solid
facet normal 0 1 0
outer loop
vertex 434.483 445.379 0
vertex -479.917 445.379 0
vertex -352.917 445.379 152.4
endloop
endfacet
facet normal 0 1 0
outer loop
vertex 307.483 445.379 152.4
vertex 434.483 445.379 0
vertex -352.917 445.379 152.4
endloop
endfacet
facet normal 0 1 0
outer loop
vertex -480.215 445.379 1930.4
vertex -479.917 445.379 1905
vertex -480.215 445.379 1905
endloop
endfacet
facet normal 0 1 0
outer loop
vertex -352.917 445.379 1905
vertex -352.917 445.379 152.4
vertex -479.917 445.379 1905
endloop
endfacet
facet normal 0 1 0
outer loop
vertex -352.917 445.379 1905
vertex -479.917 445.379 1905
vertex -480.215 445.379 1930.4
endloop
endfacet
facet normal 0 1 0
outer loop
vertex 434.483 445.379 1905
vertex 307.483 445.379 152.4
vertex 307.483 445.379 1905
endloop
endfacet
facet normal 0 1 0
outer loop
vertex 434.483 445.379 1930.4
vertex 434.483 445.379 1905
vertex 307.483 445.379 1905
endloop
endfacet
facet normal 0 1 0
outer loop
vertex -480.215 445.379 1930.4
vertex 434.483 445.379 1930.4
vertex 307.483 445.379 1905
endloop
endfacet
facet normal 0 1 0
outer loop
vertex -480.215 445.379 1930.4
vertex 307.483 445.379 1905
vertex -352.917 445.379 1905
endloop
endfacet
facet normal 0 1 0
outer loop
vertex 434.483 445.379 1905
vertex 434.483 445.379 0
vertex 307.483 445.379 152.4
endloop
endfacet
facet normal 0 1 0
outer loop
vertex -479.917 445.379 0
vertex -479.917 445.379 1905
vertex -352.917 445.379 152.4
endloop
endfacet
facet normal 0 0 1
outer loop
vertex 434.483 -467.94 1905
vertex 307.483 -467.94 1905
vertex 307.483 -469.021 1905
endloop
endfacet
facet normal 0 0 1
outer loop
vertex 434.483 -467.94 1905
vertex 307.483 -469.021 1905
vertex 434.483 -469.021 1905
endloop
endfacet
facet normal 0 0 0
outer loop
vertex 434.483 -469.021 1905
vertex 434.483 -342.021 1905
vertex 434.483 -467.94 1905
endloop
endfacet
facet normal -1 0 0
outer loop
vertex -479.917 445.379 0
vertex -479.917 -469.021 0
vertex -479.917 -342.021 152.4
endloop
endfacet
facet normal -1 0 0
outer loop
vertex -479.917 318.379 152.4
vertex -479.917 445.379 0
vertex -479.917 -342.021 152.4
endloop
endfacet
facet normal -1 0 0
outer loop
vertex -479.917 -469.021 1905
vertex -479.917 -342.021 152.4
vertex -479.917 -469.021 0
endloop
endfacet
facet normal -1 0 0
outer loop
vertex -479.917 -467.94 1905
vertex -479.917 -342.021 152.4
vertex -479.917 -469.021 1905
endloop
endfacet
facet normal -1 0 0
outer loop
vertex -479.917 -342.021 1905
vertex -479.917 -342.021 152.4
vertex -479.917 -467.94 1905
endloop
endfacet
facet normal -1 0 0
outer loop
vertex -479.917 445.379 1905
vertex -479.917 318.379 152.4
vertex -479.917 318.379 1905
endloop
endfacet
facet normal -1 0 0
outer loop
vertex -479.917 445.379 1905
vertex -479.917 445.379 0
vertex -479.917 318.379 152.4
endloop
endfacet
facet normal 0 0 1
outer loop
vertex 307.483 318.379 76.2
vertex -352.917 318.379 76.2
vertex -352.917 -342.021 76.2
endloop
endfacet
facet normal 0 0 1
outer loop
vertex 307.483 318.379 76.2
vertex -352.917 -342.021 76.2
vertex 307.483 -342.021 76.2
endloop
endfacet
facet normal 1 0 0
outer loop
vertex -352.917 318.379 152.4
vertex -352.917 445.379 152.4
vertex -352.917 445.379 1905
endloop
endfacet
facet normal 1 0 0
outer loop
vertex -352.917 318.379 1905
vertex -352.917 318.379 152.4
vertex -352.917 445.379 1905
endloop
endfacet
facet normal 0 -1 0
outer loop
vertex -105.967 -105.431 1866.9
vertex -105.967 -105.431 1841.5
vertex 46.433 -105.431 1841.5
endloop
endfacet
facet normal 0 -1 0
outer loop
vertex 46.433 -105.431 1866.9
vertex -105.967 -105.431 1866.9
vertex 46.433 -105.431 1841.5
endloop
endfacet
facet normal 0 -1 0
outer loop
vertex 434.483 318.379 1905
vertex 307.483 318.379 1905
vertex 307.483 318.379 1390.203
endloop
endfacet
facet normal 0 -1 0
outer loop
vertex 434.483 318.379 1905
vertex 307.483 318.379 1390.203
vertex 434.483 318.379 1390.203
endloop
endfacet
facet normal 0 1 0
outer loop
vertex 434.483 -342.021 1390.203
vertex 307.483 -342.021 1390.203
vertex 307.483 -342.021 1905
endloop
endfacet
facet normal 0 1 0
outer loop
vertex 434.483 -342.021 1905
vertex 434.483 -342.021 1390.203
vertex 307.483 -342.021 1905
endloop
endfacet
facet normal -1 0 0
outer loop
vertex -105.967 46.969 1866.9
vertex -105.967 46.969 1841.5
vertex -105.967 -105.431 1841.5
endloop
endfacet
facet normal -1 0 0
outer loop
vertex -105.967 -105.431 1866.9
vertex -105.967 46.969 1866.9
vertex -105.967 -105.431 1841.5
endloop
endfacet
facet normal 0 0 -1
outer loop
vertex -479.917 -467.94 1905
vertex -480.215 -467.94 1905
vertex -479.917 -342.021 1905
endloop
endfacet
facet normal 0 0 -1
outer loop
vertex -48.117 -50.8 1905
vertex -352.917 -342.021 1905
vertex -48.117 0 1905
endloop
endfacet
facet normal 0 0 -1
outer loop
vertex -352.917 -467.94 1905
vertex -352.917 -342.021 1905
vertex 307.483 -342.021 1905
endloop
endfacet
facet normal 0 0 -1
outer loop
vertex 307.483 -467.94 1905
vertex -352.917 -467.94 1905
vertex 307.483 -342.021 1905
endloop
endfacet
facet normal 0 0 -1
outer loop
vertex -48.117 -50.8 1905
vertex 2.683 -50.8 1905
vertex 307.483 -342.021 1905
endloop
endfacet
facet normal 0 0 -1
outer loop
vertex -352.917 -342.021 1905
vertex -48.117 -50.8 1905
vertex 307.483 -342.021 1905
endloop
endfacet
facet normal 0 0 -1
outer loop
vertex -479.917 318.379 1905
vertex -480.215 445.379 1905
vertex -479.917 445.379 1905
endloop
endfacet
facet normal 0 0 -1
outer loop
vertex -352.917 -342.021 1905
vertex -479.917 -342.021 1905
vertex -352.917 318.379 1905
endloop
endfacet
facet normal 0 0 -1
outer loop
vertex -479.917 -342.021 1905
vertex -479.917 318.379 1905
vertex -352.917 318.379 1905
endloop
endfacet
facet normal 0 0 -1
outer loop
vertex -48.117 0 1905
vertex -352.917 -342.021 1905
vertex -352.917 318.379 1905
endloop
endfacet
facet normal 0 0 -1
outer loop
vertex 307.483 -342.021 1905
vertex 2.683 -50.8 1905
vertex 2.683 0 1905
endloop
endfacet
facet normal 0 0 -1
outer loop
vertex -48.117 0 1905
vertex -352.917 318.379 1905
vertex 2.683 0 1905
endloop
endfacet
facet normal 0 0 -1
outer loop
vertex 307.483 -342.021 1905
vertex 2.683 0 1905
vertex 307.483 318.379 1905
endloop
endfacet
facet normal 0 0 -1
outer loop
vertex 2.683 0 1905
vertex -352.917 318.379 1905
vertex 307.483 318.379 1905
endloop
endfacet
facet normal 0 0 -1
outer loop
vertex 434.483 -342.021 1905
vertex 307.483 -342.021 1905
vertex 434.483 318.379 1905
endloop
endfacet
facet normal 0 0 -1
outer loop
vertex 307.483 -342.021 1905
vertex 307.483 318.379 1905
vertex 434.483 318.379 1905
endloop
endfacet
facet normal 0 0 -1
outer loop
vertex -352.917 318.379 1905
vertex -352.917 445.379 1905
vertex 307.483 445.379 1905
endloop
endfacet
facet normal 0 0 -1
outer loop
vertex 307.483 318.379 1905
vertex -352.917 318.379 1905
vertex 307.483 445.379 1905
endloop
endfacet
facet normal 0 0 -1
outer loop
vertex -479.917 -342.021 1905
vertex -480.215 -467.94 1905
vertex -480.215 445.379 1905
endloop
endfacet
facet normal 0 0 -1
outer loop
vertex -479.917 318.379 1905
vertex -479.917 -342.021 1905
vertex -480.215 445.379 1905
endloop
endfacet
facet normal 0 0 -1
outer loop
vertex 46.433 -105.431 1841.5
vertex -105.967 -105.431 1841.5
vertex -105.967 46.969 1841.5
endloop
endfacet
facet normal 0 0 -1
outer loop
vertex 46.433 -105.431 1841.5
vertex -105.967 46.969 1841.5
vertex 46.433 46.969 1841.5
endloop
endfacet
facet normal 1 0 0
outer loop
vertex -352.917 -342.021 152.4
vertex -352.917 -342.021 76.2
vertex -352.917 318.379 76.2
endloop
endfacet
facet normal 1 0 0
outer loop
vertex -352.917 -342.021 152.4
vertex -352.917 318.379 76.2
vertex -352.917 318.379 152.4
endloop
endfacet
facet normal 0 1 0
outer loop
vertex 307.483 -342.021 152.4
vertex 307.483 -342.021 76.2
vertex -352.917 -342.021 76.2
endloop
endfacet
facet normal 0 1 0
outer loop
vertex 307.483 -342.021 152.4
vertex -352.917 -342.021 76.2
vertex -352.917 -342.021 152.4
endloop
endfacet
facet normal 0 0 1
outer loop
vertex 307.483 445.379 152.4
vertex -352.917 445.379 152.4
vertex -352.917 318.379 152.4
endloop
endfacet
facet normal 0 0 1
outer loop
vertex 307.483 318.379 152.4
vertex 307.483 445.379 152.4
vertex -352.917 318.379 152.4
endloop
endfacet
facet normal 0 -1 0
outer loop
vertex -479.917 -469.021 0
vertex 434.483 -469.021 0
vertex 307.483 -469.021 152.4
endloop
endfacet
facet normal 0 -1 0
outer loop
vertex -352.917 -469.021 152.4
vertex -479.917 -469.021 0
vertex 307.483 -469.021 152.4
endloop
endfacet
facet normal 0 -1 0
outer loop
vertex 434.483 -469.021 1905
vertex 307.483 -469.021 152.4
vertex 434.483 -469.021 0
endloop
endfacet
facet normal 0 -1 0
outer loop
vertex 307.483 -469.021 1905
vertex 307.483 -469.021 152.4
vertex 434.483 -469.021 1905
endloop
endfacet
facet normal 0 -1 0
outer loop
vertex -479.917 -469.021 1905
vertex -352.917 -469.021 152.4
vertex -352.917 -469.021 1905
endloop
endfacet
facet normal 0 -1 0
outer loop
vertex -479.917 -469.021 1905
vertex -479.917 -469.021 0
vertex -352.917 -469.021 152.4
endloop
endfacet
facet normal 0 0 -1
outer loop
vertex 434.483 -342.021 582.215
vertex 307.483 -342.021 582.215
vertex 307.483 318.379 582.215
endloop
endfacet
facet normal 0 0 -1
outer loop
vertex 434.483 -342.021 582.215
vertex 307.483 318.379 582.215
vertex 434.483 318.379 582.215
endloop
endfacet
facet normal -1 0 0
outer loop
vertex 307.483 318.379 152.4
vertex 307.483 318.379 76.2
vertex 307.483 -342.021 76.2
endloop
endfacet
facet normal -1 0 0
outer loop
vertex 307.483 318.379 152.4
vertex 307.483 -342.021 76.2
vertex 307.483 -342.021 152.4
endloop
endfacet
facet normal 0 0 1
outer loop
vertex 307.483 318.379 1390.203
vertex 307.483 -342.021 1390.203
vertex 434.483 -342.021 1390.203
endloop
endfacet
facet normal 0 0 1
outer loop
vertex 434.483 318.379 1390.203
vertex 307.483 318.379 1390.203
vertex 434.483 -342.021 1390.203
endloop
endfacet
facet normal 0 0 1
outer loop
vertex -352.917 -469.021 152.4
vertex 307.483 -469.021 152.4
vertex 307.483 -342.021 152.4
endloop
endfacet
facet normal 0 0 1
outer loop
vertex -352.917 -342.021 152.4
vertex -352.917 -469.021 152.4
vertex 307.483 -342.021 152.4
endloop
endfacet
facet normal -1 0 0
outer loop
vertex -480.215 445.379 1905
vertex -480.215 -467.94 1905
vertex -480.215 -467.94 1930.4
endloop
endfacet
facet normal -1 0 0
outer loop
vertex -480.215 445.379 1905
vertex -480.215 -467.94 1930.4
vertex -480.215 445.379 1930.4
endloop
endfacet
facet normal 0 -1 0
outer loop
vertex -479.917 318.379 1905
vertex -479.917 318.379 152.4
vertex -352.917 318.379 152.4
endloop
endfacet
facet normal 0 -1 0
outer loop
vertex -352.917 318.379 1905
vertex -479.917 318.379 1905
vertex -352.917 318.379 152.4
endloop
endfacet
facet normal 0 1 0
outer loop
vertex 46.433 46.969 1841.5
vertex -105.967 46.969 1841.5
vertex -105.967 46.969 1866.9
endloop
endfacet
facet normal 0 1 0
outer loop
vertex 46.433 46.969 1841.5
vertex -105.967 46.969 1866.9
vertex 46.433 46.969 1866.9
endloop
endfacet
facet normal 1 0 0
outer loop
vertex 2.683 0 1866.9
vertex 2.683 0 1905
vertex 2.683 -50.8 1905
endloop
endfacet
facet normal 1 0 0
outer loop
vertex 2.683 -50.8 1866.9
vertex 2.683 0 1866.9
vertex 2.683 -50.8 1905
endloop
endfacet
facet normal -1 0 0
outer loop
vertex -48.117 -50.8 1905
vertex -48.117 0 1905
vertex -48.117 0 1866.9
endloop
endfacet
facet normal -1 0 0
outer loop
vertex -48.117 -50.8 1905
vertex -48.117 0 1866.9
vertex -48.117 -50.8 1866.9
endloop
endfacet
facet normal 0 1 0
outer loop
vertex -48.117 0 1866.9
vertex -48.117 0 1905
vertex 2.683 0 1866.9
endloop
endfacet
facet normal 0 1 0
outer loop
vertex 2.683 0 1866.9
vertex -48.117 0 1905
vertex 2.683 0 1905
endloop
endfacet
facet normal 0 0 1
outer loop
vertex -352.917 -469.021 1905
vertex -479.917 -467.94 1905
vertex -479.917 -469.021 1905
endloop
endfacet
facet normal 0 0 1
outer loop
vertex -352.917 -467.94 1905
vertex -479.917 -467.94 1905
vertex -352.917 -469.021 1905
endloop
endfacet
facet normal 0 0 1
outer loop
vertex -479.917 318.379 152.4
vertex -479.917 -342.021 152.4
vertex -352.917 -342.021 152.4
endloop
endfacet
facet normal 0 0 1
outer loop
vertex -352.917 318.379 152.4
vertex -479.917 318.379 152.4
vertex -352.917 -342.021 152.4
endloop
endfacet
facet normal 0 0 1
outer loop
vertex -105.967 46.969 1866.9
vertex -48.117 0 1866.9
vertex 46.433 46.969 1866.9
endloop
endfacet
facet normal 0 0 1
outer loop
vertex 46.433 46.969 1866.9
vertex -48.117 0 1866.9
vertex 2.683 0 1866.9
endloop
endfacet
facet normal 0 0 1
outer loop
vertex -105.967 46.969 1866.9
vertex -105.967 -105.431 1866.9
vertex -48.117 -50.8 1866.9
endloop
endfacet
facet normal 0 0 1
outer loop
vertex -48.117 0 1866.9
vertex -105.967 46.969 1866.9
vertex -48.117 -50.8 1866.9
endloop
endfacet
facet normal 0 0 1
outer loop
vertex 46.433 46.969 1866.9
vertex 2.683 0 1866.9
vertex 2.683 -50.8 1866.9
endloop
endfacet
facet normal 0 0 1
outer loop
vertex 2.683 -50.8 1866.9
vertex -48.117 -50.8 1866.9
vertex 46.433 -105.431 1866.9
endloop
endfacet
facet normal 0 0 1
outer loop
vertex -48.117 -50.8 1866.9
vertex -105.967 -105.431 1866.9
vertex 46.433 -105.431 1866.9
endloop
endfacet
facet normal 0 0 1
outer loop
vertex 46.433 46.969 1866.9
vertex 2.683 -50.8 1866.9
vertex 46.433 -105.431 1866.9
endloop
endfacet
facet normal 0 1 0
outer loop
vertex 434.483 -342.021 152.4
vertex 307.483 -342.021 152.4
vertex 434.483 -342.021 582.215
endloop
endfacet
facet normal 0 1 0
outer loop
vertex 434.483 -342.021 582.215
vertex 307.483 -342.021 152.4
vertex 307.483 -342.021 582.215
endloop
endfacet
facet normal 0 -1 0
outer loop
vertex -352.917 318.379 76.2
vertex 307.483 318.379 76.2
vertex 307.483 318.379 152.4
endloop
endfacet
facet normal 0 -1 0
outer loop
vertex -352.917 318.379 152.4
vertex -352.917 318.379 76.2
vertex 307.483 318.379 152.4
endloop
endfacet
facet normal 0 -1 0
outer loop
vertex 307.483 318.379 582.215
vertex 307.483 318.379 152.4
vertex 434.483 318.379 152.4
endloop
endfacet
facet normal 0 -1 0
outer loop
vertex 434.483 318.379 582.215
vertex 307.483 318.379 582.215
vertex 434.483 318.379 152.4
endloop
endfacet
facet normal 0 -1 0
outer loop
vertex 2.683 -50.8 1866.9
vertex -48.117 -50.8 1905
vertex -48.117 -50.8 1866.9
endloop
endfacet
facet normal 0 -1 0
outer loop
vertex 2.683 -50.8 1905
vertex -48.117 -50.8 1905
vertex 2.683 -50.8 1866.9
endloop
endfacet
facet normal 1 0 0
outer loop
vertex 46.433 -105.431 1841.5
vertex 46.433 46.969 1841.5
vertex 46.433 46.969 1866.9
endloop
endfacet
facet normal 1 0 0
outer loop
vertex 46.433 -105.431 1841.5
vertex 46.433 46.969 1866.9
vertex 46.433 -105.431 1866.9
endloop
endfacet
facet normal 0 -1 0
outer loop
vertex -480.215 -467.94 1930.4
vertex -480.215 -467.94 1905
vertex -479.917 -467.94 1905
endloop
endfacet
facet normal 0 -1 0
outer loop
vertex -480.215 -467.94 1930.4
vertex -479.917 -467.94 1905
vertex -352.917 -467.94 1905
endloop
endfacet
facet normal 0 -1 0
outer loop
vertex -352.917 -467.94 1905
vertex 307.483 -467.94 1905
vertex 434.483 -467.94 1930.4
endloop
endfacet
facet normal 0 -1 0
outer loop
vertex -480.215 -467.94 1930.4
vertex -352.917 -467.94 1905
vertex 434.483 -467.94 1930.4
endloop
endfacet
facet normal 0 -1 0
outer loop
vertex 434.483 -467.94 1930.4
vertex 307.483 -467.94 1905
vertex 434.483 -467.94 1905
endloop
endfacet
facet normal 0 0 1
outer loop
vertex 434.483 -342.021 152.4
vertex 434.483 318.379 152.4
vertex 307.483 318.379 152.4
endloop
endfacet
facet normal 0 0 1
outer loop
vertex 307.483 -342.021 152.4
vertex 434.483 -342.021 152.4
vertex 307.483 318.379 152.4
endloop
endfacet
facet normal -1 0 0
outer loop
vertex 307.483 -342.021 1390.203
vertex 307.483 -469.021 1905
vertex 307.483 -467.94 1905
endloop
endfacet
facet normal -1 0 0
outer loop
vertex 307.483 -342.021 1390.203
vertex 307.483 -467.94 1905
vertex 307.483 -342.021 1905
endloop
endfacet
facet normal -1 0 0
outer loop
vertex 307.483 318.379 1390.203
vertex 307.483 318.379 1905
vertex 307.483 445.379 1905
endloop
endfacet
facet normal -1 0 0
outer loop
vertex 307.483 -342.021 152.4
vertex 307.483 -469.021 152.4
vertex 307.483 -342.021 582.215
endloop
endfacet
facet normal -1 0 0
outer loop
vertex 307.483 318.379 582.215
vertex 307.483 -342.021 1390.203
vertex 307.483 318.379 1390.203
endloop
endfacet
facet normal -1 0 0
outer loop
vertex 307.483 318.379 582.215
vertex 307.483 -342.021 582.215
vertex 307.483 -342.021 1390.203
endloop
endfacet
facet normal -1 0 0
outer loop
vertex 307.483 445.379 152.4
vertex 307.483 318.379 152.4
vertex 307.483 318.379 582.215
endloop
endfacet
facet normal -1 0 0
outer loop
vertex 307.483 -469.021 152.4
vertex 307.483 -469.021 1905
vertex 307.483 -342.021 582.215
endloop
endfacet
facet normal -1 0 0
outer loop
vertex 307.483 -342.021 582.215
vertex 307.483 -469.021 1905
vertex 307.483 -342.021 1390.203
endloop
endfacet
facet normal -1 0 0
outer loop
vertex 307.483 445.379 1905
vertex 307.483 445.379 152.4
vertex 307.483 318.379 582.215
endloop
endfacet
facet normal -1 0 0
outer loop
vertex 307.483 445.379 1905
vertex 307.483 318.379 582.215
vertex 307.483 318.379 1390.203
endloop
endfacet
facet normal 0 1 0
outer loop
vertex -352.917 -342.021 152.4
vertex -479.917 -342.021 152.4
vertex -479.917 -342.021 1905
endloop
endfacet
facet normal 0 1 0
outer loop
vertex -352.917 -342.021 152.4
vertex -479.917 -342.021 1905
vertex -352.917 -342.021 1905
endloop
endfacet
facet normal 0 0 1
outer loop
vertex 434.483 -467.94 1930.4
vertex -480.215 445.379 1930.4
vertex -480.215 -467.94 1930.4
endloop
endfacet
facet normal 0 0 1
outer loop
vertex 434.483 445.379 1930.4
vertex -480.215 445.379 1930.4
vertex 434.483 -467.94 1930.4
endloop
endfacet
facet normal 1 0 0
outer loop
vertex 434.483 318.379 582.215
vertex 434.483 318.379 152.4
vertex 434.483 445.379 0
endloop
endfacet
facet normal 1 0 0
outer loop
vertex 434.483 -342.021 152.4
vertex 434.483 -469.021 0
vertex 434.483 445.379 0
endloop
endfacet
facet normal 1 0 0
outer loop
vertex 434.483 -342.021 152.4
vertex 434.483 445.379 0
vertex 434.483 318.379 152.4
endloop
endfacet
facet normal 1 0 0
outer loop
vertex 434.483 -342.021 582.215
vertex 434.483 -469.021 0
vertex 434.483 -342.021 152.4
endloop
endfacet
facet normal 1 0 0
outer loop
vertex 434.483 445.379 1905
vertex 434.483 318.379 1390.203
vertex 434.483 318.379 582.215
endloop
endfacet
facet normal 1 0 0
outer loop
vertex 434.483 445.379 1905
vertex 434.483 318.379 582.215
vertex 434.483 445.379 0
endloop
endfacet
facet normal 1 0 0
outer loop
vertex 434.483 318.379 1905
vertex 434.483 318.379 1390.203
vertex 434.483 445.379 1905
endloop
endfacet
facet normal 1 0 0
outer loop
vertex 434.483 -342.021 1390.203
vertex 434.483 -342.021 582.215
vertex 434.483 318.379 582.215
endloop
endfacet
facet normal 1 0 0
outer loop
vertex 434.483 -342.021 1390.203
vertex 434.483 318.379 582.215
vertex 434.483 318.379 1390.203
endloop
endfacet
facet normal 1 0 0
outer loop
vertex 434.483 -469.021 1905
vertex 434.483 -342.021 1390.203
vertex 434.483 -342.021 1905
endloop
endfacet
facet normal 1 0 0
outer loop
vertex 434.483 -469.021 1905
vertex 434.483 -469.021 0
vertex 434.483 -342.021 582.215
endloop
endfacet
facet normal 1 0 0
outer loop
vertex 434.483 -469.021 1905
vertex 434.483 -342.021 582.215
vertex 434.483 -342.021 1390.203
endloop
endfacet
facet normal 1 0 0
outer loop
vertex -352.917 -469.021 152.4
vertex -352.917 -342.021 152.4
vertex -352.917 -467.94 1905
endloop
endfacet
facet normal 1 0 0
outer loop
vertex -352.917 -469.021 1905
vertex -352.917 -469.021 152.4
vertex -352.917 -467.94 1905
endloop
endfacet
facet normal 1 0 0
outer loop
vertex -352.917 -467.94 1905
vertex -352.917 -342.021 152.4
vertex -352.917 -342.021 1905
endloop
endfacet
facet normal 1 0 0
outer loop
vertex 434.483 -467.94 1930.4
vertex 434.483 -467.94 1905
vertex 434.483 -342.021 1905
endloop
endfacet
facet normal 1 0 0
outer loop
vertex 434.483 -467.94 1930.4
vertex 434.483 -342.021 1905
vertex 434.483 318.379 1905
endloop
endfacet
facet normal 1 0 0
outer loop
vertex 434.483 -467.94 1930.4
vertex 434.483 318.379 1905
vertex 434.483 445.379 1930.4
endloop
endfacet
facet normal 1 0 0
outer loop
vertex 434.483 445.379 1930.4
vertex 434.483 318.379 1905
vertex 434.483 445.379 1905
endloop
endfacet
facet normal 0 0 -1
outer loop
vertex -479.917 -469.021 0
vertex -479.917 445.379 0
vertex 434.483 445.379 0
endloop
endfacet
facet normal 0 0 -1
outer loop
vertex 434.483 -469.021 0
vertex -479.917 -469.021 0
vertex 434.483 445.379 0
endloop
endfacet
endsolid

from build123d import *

# Parameters (mm, degrees)
F0_W      = 914.4
F0_H      = 914.4
F1_DEPTH  = 76.2
F2_W      = 127
F2_H      = 127
F3_DEPTH  = 1828.8
F4_W      = 914.697899
F4_H      = 913.319318
F5_DEPTH  = 25.4
F6_W      = 127
F6_H      = 76.2
F7_DEPTH  = 660.4
F8_W      = 127
F8_H      = 76.2
F9_DEPTH  = 660.4
F10_W     = 127
F10_H     = 76.2
F11_DEPTH = 660.4
F12_W     = 127
F12_H     = 76.2
F13_DEPTH = 660.4
F14_W     = 50.8
F14_H     = 50.8
F15_DEPTH = 63.5
F16_W     = 152.4
F16_H     = 152.4
F16_W_2   = 50.8
F16_H_2   = 50.8
F17_DEPTH = 25.4
F18_W     = 127
F18_H     = 807.987869
F19_DEPTH = 660.4


with BuildPart() as f1:
    # F0 (on Top) → F1 (new body)
    with BuildSketch(Plane.XY):
        with Locations((-22.716756, -11.820506)):
            Rectangle(F0_W, F0_H)
    extrude(amount=F1_DEPTH)

    # F2 (on face) → F3 (join)
    with BuildSketch(Plane.XY.offset(76.2)):
        with Locations((-416.416756, 381.879494)):
            Rectangle(F2_W, F2_H)
        with Locations((370.983244, 381.879494)):
            Rectangle(F2_W, F2_H)
        with Locations((370.983244, -405.520506)):
            Rectangle(F2_W, F2_H)
        with Locations((-416.416756, -405.520506)):
            Rectangle(F2_W, F2_H)
    extrude(amount=F3_DEPTH)

    # F4 (on face) → F5 (join)
    with BuildSketch(Plane.XY.offset(1905)):
        with Locations((-22.865706, -11.280165)):
            Rectangle(F4_W, F4_H)
    extrude(amount=F5_DEPTH)

    # F6 (on face) → F7 (join)
    with BuildSketch(Plane.XZ.offset(-318.379494)):
        with Locations((-416.416756, 114.3)):
            Rectangle(F6_W, F6_H)
    extrude(amount=F7_DEPTH)

    # F8 (on face) → F9 (join)
    with BuildSketch(Plane.YZ.offset(-352.916756)):
        with Locations((-405.520506, 114.3)):
            Rectangle(F8_W, F8_H)
    extrude(amount=F9_DEPTH)

    # F10 (on face) → F11 (join)
    with BuildSketch(Plane(origin=(0, -342.020506, 0), x_dir=(-1, 0, 0), z_dir=(0, 1, 0))):
        with Locations((-370.983244, 114.3)):
            Rectangle(F10_W, F10_H)
    extrude(amount=F11_DEPTH)

    # F12 (on face) → F13 (join)
    with BuildSketch(Plane(origin=(307.483244, 0, 0), x_dir=(0, -1, 0), z_dir=(-1, 0, 0))):
        with Locations((-381.879494, 114.3)):
            Rectangle(F12_W, F12_H)
    extrude(amount=F13_DEPTH)

    # F14 (on face) → F15 (join)
    with BuildSketch(Plane(origin=(0, 0, 1905), x_dir=(1, 0, 0), z_dir=(0, 0, -1))):
        with Locations((-22.716756, 25.4)):
            Rectangle(F14_W, F14_H)
    extrude(amount=F15_DEPTH)

    # F16 (on face) → F17 (join)
    with BuildSketch(Plane(origin=(0, 0, 1841.5), x_dir=(1, 0, 0), z_dir=(0, 0, -1))):
        with Locations((-29.767435, 29.231025)):
            Rectangle(F16_W, F16_H)
        with Locations((-22.716756, 25.4)):
            Rectangle(F16_W_2, F16_H_2, mode=Mode.SUBTRACT)
    extrude(amount=-F17_DEPTH)

    # F18 (on face) → F19 (join)
    with BuildSketch(Plane.XZ.offset(-318.379494)):
        with Locations((370.983244, 986.209064)):
            Rectangle(F18_W, F18_H)
    extrude(amount=F19_DEPTH)


solid = f1.part
